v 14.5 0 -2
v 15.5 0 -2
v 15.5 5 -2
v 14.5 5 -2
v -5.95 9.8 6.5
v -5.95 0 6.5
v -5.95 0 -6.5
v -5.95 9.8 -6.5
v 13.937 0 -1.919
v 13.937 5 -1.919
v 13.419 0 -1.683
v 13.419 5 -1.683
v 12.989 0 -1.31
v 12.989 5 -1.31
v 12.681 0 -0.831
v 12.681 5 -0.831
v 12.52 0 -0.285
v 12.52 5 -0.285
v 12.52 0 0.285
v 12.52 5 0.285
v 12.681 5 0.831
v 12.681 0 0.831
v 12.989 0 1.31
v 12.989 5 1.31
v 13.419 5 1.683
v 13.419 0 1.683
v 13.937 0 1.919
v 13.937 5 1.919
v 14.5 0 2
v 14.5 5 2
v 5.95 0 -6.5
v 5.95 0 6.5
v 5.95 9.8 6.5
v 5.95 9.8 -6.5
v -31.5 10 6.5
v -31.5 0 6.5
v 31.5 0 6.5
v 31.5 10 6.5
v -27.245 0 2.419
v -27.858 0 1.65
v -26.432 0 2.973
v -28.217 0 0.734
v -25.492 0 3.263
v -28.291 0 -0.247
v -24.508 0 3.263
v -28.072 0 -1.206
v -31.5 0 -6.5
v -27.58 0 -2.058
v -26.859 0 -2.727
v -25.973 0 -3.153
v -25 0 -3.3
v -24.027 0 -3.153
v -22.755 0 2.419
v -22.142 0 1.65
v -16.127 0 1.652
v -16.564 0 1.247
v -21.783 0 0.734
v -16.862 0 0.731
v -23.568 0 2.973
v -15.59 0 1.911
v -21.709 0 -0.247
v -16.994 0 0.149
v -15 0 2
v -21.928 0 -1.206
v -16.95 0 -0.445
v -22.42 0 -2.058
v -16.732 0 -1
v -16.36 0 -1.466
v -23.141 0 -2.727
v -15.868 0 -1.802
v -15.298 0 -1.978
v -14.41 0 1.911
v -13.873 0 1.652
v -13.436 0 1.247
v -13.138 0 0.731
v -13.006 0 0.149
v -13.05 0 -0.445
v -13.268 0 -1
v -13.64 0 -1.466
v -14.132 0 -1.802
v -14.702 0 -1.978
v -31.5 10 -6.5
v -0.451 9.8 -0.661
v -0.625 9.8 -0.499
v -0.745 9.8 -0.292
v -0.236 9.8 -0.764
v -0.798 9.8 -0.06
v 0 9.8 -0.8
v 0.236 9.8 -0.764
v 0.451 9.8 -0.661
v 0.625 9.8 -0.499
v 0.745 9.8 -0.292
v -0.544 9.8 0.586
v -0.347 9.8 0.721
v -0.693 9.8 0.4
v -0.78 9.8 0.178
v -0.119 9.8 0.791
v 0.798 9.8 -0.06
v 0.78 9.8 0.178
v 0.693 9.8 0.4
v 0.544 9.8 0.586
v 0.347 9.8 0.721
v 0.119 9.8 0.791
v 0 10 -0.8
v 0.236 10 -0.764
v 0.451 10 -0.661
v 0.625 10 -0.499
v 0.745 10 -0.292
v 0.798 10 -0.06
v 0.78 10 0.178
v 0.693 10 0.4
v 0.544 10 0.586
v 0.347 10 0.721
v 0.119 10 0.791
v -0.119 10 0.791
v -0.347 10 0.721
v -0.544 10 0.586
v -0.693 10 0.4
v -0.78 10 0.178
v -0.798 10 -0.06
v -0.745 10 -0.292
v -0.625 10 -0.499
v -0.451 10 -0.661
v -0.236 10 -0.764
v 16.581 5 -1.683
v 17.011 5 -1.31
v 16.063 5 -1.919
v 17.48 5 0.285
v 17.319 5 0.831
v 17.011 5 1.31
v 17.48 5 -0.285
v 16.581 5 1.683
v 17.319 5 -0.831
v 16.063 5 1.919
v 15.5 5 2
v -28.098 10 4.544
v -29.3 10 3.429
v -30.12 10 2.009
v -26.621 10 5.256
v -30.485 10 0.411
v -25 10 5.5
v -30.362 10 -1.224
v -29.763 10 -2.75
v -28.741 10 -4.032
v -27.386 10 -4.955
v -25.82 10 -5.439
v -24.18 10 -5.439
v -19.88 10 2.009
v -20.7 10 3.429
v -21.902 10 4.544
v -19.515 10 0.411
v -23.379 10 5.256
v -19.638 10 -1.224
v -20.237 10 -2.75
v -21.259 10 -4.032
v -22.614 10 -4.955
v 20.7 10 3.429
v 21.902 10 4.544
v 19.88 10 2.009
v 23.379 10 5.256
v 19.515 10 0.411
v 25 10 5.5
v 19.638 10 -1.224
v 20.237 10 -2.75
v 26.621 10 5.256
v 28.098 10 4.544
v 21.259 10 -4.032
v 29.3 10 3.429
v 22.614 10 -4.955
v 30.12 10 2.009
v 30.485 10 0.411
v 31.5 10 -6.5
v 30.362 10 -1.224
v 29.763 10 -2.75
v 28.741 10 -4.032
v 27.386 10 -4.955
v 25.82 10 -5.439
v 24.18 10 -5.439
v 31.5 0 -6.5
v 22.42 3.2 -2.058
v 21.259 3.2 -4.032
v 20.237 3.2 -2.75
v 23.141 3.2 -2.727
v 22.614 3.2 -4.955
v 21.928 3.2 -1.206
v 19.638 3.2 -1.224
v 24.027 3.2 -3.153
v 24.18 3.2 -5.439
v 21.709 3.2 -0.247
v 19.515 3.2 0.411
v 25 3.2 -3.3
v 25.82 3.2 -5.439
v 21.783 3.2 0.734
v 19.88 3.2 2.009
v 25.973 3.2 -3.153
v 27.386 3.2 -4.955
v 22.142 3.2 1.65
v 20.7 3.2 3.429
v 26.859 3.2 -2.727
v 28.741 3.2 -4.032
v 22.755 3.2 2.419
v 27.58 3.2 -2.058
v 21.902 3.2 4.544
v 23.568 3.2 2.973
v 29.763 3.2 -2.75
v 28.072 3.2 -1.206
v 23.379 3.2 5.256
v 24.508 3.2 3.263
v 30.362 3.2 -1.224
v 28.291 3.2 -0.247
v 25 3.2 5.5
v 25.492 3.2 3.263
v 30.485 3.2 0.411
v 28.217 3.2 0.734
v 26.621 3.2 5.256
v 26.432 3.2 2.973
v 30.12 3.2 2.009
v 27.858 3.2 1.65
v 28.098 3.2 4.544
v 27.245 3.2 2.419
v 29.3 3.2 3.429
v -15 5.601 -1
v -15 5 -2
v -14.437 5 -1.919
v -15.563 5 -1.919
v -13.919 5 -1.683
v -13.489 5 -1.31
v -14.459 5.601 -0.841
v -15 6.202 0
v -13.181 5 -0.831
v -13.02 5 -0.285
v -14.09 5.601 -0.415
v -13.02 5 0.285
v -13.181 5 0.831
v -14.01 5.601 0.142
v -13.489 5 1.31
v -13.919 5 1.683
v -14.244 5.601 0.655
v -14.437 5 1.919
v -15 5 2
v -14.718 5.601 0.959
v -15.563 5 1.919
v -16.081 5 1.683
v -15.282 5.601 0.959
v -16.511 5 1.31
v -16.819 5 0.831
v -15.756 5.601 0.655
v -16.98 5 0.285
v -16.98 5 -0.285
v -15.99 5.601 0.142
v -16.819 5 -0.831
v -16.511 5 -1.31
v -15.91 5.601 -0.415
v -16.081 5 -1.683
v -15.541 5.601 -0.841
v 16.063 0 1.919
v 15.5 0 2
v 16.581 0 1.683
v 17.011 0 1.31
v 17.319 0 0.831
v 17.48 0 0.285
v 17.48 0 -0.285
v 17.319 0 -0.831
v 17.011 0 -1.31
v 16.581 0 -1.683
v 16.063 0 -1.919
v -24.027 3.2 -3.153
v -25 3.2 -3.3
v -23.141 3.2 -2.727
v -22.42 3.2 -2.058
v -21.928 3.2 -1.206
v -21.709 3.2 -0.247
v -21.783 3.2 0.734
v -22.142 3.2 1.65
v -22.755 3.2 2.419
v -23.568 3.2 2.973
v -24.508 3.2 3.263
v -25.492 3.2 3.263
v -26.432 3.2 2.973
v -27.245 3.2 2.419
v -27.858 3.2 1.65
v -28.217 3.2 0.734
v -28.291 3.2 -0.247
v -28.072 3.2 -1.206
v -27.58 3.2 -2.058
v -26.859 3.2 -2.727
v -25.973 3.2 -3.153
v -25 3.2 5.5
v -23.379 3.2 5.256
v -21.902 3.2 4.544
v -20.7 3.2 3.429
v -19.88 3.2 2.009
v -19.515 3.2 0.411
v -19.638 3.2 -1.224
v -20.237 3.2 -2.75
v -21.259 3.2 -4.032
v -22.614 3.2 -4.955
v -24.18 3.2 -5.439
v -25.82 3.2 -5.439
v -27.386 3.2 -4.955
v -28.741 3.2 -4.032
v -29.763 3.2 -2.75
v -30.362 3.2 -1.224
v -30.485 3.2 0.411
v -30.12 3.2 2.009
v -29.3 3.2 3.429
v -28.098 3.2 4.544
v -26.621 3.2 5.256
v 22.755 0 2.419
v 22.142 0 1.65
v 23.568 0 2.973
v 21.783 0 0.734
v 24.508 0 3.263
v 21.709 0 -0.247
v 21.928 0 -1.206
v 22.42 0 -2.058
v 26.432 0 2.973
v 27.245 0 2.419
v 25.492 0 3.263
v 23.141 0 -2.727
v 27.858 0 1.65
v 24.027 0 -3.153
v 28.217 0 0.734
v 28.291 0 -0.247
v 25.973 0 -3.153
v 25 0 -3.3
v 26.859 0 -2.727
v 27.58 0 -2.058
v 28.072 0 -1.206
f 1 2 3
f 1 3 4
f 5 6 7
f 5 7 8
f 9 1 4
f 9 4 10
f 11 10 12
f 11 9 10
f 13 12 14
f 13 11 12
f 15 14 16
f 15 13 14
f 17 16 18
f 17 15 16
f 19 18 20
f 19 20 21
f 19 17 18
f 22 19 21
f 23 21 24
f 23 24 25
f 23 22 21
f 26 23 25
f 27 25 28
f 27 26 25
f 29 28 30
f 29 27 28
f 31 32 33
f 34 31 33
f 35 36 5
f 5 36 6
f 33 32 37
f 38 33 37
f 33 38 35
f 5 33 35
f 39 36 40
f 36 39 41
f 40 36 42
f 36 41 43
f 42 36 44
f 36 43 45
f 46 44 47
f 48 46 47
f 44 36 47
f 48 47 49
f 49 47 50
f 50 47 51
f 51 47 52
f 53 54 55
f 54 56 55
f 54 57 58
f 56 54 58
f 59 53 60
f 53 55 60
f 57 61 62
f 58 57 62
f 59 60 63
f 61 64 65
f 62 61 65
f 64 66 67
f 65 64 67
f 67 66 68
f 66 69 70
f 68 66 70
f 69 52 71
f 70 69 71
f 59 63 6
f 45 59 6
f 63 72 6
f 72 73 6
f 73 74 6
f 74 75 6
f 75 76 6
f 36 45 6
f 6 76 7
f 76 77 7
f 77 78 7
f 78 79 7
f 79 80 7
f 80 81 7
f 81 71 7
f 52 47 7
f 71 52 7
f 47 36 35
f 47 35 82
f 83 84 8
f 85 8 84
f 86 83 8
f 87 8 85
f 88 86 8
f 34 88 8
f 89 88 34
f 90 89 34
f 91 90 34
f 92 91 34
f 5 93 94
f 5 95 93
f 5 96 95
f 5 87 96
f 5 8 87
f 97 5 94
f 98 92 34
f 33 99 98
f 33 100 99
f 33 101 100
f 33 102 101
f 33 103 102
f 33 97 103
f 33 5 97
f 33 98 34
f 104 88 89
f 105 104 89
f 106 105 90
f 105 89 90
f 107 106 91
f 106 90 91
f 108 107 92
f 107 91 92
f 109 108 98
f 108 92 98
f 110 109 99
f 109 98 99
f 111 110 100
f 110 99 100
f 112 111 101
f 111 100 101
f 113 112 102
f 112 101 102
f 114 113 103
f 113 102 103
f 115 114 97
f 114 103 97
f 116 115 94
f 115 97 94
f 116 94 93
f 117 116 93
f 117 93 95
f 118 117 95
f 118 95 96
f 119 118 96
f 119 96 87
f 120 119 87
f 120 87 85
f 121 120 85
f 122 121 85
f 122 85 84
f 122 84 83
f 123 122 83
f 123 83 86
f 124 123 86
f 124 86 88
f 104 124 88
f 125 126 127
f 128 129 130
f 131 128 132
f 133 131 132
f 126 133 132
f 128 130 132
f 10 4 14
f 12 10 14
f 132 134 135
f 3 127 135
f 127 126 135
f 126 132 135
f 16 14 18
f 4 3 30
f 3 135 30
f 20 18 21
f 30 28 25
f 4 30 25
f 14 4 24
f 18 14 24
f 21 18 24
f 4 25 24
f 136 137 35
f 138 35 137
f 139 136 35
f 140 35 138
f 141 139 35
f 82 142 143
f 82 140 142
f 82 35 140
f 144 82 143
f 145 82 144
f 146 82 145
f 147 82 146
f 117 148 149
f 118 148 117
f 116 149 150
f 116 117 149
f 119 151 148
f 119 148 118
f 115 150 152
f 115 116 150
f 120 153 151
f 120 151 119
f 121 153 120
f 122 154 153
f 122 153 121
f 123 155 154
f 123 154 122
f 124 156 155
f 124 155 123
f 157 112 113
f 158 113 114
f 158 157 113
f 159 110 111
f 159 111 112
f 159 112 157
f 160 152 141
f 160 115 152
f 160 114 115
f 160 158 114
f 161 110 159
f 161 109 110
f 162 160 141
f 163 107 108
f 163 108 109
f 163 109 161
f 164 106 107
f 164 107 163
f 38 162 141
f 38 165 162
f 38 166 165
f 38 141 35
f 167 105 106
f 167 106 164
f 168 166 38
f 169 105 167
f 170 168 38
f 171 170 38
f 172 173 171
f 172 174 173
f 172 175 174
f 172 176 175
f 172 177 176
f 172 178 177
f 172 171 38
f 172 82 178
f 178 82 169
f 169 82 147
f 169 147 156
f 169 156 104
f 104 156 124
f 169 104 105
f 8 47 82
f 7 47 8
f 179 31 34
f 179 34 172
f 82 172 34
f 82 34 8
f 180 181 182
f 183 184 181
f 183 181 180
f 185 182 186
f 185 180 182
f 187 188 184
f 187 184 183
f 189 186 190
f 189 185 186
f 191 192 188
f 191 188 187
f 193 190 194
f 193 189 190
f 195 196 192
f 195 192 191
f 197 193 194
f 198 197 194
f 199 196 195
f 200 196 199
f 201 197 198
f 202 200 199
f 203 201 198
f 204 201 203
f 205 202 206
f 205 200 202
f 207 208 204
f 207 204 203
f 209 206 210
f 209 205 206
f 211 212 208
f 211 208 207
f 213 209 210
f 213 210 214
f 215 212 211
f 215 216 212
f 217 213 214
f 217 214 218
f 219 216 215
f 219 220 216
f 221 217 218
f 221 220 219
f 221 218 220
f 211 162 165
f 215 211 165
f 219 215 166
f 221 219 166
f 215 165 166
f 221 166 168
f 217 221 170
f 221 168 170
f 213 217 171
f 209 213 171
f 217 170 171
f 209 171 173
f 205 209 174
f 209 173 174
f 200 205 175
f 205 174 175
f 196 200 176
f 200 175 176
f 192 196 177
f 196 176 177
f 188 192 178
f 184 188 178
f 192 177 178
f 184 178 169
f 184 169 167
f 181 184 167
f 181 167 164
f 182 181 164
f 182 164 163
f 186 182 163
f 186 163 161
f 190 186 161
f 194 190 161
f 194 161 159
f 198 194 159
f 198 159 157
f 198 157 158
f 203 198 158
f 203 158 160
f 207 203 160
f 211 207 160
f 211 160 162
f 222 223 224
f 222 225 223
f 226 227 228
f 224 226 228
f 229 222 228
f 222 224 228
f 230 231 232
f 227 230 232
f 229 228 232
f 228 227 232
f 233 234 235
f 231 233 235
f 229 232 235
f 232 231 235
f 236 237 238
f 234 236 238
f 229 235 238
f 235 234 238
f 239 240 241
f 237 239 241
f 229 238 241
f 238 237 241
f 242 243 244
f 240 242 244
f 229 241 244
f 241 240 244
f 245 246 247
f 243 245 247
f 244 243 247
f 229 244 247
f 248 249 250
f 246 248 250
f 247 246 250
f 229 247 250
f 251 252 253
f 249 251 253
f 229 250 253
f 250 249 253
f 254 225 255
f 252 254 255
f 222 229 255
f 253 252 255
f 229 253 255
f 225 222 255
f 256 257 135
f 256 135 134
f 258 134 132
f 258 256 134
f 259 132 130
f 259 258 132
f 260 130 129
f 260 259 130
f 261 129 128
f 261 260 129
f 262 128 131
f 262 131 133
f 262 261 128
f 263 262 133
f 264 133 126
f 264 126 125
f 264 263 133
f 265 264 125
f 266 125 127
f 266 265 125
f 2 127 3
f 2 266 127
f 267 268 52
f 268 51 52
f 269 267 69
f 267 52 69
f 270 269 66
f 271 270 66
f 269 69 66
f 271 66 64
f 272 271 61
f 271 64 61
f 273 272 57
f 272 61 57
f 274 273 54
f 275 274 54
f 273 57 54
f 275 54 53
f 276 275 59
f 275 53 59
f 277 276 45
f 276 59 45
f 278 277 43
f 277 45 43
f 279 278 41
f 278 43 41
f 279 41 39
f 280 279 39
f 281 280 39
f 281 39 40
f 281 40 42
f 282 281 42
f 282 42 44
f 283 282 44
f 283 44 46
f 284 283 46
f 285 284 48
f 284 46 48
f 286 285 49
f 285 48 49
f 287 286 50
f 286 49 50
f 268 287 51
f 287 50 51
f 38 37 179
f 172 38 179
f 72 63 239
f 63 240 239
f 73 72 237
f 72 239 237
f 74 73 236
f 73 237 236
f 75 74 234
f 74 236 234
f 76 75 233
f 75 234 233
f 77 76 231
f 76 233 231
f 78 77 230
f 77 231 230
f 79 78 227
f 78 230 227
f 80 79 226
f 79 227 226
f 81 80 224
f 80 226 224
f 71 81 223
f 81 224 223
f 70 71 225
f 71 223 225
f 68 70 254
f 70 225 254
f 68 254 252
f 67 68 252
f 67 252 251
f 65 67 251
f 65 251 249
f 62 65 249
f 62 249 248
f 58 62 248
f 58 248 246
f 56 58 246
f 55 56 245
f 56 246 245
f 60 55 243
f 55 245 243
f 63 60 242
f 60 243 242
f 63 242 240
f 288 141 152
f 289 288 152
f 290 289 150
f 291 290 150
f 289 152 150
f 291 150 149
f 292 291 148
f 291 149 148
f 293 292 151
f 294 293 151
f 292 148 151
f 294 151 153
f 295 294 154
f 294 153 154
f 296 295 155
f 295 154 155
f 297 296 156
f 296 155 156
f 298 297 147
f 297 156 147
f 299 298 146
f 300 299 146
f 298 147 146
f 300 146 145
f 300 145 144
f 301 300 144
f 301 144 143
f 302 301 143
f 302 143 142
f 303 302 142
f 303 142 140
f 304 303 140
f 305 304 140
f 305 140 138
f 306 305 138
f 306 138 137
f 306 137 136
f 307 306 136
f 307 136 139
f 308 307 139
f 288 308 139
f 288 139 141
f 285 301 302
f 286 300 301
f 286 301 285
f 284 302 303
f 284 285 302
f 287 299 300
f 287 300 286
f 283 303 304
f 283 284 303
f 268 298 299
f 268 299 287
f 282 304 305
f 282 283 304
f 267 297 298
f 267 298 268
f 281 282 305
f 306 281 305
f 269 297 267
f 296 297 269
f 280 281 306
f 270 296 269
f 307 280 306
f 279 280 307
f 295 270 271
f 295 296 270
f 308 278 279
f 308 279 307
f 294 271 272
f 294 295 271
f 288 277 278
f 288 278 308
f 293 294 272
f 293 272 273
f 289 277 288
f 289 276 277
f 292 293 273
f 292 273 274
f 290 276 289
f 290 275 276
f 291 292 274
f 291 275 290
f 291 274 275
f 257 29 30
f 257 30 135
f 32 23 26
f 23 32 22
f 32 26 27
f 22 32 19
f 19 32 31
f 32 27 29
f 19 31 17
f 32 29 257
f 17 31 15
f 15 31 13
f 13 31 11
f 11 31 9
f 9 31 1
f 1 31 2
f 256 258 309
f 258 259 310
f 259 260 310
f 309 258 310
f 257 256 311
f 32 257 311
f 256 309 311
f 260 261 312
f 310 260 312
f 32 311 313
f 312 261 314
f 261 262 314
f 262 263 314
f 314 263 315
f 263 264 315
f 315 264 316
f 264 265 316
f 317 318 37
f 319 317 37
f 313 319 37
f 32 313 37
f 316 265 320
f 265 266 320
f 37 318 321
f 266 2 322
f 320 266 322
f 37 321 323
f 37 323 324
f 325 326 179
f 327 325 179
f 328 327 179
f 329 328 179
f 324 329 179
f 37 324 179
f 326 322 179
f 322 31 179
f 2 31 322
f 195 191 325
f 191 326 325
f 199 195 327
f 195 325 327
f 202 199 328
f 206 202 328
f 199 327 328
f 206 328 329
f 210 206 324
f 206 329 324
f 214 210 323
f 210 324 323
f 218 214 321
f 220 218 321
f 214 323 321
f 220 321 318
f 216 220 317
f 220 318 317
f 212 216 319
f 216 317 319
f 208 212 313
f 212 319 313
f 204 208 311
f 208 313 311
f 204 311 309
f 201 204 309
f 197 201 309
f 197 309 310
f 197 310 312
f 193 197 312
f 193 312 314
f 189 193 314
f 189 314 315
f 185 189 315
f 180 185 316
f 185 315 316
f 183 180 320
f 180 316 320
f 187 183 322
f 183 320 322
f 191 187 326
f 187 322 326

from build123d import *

# Parameters (mm, degrees)
SKETCH_1_W                = 63
SKETCH_1_H                = 13
EXTRUDE_1_DEPTH           = 10
HOLE_WIZARD_1_D           = 6.6
HOLE_WIZARD_1_CBORE_D     = 11
HOLE_WIZARD_1_CBORE_DEPTH = 6.8
MM_1_D                    = 4
MM_1_DEPTH                = 5
MM_1_TIP                  = 1.201721238
CUT_EXTRUDE_1_DEPTH       = 5
HOLE_WIZARD_M2_1_D        = 1.6
SKETCH_9_W                = 11.9
SKETCH_9_H                = 9.8
CUT_EXTRUDE_2_DEPTH       = 36.514081714


with BuildPart() as part:
    # 草图1 → 凸台-拉伸1 (new body)
    with BuildSketch(Plane(origin=(0, 0, 0), x_dir=(1, 0, 0), z_dir=(0, 1, 0))):
        Rectangle(SKETCH_1_W, SKETCH_1_H)
    extrude(amount=EXTRUDE_1_DEPTH)

    # 打孔尺寸(%根据)内六角圆柱头螺钉的类型1 (through all)
    with Locations(Plane(origin=(-25, 10, 0), x_dir=(0, 0, 1), z_dir=(0, 1, 0))):
        with Locations((0, 0), (0, 50)):
            CounterBoreHole(HOLE_WIZARD_1_D / 2, HOLE_WIZARD_1_CBORE_D / 2, HOLE_WIZARD_1_CBORE_DEPTH)

    # 大小mm 暗销孔1
    with Locations(Plane(origin=(-15, 0, 0), x_dir=(0, 0, -1), z_dir=(0, -1, 0))):
        with Locations((0, 0)):
            Hole(MM_1_D / 2, depth=MM_1_DEPTH)
            with Locations((0, 0, -(MM_1_DEPTH + MM_1_TIP / 2))):  # 118° drill point
                Cone(0, MM_1_D / 2, MM_1_TIP, mode=Mode.SUBTRACT)

    # 草图6 → 切除-拉伸1 (cut)
    with BuildSketch(Plane.XZ):
        with BuildLine():
            Line((14.5, 2), (15.5, 2))
            ThreePointArc((15.5, 2), (17.5, 0), (15.5, -2))
            Line((15.5, -2), (14.5, -2))
            ThreePointArc((14.5, -2), (12.5, 0), (14.5, 2))
        make_face()
    extrude(amount=-CUT_EXTRUDE_1_DEPTH, mode=Mode.SUBTRACT)

    # M2 螺纹孔1 (through all)
    with Locations(Plane.ZX.offset(10)):
        with Locations((0, 0)):
            Hole(HOLE_WIZARD_M2_1_D / 2)

    # 草图9 → 切除-拉伸2 (cut, through all)
    with BuildSketch(Plane.XY.offset(6.5)):
        with Locations((0, 4.9)):
            Rectangle(SKETCH_9_W, SKETCH_9_H)
    extrude(amount=-CUT_EXTRUDE_2_DEPTH, mode=Mode.SUBTRACT)


solid = part.part
